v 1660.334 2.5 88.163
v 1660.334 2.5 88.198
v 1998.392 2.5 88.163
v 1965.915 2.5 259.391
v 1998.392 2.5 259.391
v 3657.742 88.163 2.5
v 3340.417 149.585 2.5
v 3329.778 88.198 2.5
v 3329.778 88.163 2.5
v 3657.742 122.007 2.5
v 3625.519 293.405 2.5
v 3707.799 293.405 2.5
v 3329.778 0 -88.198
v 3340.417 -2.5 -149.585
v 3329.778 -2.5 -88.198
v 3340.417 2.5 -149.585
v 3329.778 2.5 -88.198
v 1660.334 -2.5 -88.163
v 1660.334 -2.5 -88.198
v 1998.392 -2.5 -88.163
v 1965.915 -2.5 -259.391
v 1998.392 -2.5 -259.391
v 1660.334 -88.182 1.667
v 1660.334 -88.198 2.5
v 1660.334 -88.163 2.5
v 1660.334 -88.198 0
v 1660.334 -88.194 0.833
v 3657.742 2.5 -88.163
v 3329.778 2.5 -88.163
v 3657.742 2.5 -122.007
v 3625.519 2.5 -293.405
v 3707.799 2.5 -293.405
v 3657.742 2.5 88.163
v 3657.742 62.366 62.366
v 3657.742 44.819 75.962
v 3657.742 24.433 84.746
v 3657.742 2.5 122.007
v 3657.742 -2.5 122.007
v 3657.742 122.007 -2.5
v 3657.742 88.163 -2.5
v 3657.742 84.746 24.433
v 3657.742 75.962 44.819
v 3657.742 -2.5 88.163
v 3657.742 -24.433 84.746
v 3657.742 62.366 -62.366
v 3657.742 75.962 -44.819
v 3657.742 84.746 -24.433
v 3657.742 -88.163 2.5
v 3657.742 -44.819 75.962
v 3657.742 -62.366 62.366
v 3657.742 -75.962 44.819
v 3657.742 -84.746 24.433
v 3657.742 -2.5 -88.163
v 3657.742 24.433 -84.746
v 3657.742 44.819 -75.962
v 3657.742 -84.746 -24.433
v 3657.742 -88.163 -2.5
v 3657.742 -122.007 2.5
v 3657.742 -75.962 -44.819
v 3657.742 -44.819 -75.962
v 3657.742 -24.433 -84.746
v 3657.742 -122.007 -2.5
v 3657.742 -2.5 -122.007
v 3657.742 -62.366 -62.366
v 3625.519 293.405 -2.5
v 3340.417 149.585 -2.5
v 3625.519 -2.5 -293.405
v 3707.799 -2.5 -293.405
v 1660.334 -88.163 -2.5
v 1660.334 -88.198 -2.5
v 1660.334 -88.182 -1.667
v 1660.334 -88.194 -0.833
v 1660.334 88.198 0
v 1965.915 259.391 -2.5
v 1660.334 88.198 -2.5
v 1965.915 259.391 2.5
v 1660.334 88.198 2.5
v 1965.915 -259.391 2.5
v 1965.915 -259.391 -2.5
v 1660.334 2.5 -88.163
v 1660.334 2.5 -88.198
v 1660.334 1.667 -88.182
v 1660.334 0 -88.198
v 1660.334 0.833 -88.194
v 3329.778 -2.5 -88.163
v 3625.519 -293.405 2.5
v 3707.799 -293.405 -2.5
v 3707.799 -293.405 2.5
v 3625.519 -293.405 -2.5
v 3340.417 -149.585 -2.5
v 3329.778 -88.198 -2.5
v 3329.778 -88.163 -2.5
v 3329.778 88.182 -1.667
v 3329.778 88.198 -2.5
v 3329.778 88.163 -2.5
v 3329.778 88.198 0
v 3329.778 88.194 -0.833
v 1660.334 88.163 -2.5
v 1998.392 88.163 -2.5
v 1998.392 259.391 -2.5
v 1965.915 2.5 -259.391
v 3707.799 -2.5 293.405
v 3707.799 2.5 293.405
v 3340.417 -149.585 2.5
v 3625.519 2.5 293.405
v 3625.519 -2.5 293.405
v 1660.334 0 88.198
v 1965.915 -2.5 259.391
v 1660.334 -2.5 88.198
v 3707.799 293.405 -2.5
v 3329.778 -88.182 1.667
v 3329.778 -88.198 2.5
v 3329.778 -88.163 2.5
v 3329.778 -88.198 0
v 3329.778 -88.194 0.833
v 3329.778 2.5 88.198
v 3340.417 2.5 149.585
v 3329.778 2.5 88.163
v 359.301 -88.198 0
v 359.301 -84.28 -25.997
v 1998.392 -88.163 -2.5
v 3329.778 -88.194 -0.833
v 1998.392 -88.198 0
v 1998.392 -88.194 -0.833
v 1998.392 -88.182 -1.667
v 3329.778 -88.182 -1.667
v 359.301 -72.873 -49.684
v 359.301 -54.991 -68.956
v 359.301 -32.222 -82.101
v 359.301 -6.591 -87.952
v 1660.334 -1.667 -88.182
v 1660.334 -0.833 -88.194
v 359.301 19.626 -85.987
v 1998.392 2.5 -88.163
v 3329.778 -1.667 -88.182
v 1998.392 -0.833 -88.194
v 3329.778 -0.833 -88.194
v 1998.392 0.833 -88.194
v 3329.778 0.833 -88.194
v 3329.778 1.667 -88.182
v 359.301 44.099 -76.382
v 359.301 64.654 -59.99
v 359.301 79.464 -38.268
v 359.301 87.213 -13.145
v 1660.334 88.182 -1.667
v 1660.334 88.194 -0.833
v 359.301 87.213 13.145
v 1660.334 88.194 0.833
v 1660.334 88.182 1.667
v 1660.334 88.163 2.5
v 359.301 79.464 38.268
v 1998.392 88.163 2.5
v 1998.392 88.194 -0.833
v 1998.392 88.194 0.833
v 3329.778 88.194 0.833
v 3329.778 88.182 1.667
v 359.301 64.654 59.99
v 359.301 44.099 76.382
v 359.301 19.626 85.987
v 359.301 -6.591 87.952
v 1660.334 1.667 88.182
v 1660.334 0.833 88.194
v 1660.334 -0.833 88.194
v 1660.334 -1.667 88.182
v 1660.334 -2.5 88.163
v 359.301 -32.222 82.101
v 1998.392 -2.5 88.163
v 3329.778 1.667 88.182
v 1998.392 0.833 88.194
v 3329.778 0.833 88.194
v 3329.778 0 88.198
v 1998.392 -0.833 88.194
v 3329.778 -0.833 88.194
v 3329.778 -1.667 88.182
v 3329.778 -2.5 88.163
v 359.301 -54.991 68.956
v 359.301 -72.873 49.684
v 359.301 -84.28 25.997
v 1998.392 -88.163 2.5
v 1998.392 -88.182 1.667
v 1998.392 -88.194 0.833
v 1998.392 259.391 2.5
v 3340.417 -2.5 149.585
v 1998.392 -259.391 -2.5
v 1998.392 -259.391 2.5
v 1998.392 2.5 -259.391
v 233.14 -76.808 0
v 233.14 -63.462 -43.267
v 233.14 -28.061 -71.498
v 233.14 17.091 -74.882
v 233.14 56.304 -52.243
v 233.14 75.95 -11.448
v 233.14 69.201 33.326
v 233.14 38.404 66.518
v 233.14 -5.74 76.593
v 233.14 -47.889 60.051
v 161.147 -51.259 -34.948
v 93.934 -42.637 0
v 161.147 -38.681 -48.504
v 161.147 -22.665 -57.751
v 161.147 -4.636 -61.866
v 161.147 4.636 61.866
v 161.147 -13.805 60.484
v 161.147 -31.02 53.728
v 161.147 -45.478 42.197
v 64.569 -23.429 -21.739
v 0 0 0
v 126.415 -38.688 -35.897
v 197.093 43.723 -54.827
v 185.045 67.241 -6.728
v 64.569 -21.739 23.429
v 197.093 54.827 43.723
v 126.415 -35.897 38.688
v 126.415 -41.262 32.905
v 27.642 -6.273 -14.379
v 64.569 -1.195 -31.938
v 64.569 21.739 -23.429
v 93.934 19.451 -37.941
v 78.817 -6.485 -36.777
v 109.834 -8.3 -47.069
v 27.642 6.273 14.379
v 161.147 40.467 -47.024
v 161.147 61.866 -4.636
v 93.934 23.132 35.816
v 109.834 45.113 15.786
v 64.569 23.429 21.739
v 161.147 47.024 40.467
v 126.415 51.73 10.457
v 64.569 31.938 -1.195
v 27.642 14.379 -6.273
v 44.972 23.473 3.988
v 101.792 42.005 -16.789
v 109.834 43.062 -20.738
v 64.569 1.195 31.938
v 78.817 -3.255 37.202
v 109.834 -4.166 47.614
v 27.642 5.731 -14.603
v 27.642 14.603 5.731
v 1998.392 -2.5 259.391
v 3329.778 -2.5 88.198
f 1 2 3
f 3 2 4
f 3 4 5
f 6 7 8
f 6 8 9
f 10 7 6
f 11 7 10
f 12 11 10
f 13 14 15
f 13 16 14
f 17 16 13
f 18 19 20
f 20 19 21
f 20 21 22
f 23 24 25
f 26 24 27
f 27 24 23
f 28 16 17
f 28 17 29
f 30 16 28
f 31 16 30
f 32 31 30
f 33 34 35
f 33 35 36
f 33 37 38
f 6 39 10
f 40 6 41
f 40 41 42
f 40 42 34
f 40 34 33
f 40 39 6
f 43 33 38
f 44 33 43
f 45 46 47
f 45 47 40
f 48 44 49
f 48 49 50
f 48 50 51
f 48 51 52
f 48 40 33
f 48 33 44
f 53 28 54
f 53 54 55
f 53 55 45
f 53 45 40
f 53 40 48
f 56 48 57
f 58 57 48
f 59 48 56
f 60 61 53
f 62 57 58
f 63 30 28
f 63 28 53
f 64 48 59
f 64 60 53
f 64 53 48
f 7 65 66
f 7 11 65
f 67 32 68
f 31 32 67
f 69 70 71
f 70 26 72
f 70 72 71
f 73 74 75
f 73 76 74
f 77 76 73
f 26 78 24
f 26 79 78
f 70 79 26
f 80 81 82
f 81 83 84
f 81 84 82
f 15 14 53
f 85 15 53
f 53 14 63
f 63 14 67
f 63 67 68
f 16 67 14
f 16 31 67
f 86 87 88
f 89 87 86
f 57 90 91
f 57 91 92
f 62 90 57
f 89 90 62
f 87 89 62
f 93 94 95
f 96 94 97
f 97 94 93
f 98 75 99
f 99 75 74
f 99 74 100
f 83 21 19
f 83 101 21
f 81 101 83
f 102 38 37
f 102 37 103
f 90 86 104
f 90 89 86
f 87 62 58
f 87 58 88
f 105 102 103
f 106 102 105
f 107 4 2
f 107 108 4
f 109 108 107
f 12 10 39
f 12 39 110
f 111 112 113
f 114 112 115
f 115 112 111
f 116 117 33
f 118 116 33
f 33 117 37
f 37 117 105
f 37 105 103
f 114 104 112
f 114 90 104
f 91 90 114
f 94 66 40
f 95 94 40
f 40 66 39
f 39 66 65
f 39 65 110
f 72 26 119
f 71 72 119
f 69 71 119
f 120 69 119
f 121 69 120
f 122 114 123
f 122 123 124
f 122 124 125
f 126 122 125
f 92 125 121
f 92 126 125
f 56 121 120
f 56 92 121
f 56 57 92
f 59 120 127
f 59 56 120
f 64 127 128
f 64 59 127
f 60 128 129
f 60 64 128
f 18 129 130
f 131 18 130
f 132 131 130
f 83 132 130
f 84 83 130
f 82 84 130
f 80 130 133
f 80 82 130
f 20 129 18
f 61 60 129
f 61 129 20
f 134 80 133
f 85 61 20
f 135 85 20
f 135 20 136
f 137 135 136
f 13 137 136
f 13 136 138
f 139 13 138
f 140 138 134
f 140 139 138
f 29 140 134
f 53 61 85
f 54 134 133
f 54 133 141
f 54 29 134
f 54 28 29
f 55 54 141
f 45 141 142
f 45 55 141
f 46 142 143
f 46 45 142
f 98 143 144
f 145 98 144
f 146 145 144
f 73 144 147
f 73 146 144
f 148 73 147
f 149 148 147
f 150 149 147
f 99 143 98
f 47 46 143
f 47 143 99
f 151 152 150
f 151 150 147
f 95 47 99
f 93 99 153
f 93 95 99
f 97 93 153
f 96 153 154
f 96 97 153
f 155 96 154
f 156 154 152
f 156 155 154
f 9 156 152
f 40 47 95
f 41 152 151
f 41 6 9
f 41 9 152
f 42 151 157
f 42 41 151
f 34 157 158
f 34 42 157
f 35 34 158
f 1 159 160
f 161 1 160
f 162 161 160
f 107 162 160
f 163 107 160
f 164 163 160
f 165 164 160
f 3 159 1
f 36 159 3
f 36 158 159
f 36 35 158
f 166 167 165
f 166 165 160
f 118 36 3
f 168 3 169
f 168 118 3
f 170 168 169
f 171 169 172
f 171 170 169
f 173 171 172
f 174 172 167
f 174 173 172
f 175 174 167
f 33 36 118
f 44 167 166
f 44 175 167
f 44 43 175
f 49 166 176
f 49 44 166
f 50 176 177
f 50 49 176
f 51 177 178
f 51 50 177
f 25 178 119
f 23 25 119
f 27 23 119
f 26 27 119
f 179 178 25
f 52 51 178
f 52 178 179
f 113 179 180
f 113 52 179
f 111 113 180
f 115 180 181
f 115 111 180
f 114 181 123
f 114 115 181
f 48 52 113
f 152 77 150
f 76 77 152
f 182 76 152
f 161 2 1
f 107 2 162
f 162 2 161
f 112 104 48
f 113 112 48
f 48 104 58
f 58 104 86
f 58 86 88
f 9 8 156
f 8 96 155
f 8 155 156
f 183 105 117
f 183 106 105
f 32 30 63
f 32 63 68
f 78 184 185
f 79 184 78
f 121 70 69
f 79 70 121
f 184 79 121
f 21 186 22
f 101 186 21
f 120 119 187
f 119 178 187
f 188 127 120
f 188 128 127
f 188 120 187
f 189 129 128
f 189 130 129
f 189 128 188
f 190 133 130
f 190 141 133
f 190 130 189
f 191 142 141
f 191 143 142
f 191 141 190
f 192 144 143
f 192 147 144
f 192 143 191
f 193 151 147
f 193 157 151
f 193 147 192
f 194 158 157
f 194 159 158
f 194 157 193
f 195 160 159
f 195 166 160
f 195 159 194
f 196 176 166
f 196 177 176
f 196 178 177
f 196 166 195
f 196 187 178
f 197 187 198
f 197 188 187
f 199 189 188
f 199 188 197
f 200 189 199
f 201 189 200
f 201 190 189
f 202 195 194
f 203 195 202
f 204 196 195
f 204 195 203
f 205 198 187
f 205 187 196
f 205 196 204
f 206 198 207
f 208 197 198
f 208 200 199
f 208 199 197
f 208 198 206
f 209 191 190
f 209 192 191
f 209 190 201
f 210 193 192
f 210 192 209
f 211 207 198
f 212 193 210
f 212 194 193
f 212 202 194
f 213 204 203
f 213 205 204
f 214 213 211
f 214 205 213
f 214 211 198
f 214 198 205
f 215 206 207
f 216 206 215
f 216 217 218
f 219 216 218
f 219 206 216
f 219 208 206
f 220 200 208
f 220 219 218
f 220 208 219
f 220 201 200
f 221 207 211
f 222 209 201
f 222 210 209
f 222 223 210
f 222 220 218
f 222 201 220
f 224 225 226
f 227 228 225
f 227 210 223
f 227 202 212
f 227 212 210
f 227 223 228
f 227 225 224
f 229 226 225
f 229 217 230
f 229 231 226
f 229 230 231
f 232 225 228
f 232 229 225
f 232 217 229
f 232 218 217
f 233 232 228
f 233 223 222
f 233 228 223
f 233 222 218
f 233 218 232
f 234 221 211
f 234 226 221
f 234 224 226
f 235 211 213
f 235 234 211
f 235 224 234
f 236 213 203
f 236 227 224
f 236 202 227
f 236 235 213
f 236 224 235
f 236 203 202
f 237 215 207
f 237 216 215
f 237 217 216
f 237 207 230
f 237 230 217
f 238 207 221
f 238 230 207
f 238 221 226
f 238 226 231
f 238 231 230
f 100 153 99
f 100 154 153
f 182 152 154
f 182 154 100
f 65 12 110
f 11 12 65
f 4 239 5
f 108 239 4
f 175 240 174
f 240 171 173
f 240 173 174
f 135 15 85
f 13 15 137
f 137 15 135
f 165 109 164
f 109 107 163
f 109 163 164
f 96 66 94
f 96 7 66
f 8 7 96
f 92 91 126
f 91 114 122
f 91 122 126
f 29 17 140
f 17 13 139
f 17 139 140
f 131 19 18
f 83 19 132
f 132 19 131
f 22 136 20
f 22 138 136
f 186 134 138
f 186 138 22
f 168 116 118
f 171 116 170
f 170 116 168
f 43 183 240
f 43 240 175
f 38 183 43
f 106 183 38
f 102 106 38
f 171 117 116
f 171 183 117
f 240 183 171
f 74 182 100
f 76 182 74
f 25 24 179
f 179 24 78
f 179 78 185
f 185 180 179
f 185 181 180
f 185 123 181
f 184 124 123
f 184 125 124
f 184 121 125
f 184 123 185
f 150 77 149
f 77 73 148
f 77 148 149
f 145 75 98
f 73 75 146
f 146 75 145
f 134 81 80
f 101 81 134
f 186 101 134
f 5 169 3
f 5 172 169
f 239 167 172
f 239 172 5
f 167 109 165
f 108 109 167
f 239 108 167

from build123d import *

# Parameters (mm, degrees)
BOSS_EXTRUDE1_DEPTH   = 0.529212532
BOSS_EXTRUDE1_2_DEPTH = 0.529212532
CIRPATTERN1_COUNT     = 4
SCALE1_SCALE          = 4.724
BODY_MOVE_COPY1_ANGLE = 90


with BuildPart() as part:
    # Sketch1 → Revolve1 (revolve)
    with BuildSketch(Plane.XY, mode=Mode.PRIVATE) as revolve1_sk:
        with BuildLine():
            Line((111.973953624, 86.213943438), (810.204439049, 86.213943438))
            Line((810.204439049, 86.213943438), (810.204439049, 67.543714902))
            Line((810.204439049, 67.543714902), (35.915373063, 67.543714902))
            add(Edge.make_bspline(
                [(35.915373063, 67.543714902), (64.316707395, 86.213943438), (111.973953624, 86.213943438)],
                knots=[0, 0, 0, 1, 1, 1], degree=2, weights=[1, 0.685812689, 1]))
        make_face()
    revolve(revolve1_sk.sketch.rotate(Axis((35.915373063, 67.543714902, 0), (1, 0, 0)), 90), axis=Axis((35.915373063, 67.543714902, 0), (1, 0, 0)))


with BuildPart() as body_2:
    # Sketch2 → Boss-Extrude1 (new, symmetric)
    with BuildSketch(Plane.XY):
        Polygon((387.383276717, 83.038943438), (458.945056672, 83.038943438), (458.945056672, 122.452801344), (452.070125847, 122.452801344), (387.383276717, 86.213943438), align=None)
    extrude(amount=BOSS_EXTRUDE1_DEPTH, both=True)


with BuildPart() as body_3:
    # Sketch2 → Boss-Extrude1 2 (new, symmetric)
    with BuildSketch(Plane.XY):
        Polygon((740.77939896, 86.213943438), (740.77939896, 83.038943438), (810.204439049, 83.038943438), (810.204439049, 86.213943438), (810.204439049, 93.370738151), (820.800846483, 129.653166351), (803.38333804, 129.653166351), (743.031647149, 99.208669237), align=None)
    extrude(amount=BOSS_EXTRUDE1_2_DEPTH, both=True)


with BuildPart() as cirpattern1_1:
    # CirPattern1: pattern copy
    add(body_3.part.rotate(Axis((0, 67.543714902, 0), (1, 0, 0)), 1 * 360 / CIRPATTERN1_COUNT))


with BuildPart() as cirpattern1_2:
    # CirPattern1: pattern copy
    add(body_3.part.rotate(Axis((0, 67.543714902, 0), (1, 0, 0)), 2 * 360 / CIRPATTERN1_COUNT))


with BuildPart() as cirpattern1_3:
    # CirPattern1: pattern copy
    add(body_3.part.rotate(Axis((0, 67.543714902, 0), (1, 0, 0)), 3 * 360 / CIRPATTERN1_COUNT))


with BuildPart() as cirpattern1_4:
    # CirPattern1: pattern copy
    add(body_2.part.rotate(Axis((0, 67.543714902, 0), (1, 0, 0)), 1 * 360 / CIRPATTERN1_COUNT))


with BuildPart() as cirpattern1_5:
    # CirPattern1: pattern copy
    add(body_2.part.rotate(Axis((0, 67.543714902, 0), (1, 0, 0)), 2 * 360 / CIRPATTERN1_COUNT))


with BuildPart() as cirpattern1_6:
    # CirPattern1: pattern copy
    add(body_2.part.rotate(Axis((0, 67.543714902, 0), (1, 0, 0)), 3 * 360 / CIRPATTERN1_COUNT))


with BuildPart() as part_1:
    add(part.part)

    # Combine1: union CirPattern1_4, body 2, CirPattern1_6, CirPattern1_5, body 3, CirPattern1_1, CirPattern1_3, CirPattern1_2
    add(cirpattern1_4.part)
    add(body_2.part)
    add(cirpattern1_6.part)
    add(cirpattern1_5.part)
    add(body_3.part)
    add(cirpattern1_1.part)
    add(cirpattern1_3.part)
    add(cirpattern1_2.part)


with BuildPart() as part_2:
    # Scale1: scaled about (0, 0, 0)
    add(part_1.part.scale(SCALE1_SCALE))


with BuildPart() as part_3:
    # Body-Move/Copy1: read off the stored shape, not the designer's step
    # Body-Move/Copy1: moved
    add(part_2.part.moved(Location((-169.6642223, -319.0765092, 0))).rotate(Axis((0, 0, 0), (1, 0, 0)), BODY_MOVE_COPY1_ANGLE))


solid = part_3.part
